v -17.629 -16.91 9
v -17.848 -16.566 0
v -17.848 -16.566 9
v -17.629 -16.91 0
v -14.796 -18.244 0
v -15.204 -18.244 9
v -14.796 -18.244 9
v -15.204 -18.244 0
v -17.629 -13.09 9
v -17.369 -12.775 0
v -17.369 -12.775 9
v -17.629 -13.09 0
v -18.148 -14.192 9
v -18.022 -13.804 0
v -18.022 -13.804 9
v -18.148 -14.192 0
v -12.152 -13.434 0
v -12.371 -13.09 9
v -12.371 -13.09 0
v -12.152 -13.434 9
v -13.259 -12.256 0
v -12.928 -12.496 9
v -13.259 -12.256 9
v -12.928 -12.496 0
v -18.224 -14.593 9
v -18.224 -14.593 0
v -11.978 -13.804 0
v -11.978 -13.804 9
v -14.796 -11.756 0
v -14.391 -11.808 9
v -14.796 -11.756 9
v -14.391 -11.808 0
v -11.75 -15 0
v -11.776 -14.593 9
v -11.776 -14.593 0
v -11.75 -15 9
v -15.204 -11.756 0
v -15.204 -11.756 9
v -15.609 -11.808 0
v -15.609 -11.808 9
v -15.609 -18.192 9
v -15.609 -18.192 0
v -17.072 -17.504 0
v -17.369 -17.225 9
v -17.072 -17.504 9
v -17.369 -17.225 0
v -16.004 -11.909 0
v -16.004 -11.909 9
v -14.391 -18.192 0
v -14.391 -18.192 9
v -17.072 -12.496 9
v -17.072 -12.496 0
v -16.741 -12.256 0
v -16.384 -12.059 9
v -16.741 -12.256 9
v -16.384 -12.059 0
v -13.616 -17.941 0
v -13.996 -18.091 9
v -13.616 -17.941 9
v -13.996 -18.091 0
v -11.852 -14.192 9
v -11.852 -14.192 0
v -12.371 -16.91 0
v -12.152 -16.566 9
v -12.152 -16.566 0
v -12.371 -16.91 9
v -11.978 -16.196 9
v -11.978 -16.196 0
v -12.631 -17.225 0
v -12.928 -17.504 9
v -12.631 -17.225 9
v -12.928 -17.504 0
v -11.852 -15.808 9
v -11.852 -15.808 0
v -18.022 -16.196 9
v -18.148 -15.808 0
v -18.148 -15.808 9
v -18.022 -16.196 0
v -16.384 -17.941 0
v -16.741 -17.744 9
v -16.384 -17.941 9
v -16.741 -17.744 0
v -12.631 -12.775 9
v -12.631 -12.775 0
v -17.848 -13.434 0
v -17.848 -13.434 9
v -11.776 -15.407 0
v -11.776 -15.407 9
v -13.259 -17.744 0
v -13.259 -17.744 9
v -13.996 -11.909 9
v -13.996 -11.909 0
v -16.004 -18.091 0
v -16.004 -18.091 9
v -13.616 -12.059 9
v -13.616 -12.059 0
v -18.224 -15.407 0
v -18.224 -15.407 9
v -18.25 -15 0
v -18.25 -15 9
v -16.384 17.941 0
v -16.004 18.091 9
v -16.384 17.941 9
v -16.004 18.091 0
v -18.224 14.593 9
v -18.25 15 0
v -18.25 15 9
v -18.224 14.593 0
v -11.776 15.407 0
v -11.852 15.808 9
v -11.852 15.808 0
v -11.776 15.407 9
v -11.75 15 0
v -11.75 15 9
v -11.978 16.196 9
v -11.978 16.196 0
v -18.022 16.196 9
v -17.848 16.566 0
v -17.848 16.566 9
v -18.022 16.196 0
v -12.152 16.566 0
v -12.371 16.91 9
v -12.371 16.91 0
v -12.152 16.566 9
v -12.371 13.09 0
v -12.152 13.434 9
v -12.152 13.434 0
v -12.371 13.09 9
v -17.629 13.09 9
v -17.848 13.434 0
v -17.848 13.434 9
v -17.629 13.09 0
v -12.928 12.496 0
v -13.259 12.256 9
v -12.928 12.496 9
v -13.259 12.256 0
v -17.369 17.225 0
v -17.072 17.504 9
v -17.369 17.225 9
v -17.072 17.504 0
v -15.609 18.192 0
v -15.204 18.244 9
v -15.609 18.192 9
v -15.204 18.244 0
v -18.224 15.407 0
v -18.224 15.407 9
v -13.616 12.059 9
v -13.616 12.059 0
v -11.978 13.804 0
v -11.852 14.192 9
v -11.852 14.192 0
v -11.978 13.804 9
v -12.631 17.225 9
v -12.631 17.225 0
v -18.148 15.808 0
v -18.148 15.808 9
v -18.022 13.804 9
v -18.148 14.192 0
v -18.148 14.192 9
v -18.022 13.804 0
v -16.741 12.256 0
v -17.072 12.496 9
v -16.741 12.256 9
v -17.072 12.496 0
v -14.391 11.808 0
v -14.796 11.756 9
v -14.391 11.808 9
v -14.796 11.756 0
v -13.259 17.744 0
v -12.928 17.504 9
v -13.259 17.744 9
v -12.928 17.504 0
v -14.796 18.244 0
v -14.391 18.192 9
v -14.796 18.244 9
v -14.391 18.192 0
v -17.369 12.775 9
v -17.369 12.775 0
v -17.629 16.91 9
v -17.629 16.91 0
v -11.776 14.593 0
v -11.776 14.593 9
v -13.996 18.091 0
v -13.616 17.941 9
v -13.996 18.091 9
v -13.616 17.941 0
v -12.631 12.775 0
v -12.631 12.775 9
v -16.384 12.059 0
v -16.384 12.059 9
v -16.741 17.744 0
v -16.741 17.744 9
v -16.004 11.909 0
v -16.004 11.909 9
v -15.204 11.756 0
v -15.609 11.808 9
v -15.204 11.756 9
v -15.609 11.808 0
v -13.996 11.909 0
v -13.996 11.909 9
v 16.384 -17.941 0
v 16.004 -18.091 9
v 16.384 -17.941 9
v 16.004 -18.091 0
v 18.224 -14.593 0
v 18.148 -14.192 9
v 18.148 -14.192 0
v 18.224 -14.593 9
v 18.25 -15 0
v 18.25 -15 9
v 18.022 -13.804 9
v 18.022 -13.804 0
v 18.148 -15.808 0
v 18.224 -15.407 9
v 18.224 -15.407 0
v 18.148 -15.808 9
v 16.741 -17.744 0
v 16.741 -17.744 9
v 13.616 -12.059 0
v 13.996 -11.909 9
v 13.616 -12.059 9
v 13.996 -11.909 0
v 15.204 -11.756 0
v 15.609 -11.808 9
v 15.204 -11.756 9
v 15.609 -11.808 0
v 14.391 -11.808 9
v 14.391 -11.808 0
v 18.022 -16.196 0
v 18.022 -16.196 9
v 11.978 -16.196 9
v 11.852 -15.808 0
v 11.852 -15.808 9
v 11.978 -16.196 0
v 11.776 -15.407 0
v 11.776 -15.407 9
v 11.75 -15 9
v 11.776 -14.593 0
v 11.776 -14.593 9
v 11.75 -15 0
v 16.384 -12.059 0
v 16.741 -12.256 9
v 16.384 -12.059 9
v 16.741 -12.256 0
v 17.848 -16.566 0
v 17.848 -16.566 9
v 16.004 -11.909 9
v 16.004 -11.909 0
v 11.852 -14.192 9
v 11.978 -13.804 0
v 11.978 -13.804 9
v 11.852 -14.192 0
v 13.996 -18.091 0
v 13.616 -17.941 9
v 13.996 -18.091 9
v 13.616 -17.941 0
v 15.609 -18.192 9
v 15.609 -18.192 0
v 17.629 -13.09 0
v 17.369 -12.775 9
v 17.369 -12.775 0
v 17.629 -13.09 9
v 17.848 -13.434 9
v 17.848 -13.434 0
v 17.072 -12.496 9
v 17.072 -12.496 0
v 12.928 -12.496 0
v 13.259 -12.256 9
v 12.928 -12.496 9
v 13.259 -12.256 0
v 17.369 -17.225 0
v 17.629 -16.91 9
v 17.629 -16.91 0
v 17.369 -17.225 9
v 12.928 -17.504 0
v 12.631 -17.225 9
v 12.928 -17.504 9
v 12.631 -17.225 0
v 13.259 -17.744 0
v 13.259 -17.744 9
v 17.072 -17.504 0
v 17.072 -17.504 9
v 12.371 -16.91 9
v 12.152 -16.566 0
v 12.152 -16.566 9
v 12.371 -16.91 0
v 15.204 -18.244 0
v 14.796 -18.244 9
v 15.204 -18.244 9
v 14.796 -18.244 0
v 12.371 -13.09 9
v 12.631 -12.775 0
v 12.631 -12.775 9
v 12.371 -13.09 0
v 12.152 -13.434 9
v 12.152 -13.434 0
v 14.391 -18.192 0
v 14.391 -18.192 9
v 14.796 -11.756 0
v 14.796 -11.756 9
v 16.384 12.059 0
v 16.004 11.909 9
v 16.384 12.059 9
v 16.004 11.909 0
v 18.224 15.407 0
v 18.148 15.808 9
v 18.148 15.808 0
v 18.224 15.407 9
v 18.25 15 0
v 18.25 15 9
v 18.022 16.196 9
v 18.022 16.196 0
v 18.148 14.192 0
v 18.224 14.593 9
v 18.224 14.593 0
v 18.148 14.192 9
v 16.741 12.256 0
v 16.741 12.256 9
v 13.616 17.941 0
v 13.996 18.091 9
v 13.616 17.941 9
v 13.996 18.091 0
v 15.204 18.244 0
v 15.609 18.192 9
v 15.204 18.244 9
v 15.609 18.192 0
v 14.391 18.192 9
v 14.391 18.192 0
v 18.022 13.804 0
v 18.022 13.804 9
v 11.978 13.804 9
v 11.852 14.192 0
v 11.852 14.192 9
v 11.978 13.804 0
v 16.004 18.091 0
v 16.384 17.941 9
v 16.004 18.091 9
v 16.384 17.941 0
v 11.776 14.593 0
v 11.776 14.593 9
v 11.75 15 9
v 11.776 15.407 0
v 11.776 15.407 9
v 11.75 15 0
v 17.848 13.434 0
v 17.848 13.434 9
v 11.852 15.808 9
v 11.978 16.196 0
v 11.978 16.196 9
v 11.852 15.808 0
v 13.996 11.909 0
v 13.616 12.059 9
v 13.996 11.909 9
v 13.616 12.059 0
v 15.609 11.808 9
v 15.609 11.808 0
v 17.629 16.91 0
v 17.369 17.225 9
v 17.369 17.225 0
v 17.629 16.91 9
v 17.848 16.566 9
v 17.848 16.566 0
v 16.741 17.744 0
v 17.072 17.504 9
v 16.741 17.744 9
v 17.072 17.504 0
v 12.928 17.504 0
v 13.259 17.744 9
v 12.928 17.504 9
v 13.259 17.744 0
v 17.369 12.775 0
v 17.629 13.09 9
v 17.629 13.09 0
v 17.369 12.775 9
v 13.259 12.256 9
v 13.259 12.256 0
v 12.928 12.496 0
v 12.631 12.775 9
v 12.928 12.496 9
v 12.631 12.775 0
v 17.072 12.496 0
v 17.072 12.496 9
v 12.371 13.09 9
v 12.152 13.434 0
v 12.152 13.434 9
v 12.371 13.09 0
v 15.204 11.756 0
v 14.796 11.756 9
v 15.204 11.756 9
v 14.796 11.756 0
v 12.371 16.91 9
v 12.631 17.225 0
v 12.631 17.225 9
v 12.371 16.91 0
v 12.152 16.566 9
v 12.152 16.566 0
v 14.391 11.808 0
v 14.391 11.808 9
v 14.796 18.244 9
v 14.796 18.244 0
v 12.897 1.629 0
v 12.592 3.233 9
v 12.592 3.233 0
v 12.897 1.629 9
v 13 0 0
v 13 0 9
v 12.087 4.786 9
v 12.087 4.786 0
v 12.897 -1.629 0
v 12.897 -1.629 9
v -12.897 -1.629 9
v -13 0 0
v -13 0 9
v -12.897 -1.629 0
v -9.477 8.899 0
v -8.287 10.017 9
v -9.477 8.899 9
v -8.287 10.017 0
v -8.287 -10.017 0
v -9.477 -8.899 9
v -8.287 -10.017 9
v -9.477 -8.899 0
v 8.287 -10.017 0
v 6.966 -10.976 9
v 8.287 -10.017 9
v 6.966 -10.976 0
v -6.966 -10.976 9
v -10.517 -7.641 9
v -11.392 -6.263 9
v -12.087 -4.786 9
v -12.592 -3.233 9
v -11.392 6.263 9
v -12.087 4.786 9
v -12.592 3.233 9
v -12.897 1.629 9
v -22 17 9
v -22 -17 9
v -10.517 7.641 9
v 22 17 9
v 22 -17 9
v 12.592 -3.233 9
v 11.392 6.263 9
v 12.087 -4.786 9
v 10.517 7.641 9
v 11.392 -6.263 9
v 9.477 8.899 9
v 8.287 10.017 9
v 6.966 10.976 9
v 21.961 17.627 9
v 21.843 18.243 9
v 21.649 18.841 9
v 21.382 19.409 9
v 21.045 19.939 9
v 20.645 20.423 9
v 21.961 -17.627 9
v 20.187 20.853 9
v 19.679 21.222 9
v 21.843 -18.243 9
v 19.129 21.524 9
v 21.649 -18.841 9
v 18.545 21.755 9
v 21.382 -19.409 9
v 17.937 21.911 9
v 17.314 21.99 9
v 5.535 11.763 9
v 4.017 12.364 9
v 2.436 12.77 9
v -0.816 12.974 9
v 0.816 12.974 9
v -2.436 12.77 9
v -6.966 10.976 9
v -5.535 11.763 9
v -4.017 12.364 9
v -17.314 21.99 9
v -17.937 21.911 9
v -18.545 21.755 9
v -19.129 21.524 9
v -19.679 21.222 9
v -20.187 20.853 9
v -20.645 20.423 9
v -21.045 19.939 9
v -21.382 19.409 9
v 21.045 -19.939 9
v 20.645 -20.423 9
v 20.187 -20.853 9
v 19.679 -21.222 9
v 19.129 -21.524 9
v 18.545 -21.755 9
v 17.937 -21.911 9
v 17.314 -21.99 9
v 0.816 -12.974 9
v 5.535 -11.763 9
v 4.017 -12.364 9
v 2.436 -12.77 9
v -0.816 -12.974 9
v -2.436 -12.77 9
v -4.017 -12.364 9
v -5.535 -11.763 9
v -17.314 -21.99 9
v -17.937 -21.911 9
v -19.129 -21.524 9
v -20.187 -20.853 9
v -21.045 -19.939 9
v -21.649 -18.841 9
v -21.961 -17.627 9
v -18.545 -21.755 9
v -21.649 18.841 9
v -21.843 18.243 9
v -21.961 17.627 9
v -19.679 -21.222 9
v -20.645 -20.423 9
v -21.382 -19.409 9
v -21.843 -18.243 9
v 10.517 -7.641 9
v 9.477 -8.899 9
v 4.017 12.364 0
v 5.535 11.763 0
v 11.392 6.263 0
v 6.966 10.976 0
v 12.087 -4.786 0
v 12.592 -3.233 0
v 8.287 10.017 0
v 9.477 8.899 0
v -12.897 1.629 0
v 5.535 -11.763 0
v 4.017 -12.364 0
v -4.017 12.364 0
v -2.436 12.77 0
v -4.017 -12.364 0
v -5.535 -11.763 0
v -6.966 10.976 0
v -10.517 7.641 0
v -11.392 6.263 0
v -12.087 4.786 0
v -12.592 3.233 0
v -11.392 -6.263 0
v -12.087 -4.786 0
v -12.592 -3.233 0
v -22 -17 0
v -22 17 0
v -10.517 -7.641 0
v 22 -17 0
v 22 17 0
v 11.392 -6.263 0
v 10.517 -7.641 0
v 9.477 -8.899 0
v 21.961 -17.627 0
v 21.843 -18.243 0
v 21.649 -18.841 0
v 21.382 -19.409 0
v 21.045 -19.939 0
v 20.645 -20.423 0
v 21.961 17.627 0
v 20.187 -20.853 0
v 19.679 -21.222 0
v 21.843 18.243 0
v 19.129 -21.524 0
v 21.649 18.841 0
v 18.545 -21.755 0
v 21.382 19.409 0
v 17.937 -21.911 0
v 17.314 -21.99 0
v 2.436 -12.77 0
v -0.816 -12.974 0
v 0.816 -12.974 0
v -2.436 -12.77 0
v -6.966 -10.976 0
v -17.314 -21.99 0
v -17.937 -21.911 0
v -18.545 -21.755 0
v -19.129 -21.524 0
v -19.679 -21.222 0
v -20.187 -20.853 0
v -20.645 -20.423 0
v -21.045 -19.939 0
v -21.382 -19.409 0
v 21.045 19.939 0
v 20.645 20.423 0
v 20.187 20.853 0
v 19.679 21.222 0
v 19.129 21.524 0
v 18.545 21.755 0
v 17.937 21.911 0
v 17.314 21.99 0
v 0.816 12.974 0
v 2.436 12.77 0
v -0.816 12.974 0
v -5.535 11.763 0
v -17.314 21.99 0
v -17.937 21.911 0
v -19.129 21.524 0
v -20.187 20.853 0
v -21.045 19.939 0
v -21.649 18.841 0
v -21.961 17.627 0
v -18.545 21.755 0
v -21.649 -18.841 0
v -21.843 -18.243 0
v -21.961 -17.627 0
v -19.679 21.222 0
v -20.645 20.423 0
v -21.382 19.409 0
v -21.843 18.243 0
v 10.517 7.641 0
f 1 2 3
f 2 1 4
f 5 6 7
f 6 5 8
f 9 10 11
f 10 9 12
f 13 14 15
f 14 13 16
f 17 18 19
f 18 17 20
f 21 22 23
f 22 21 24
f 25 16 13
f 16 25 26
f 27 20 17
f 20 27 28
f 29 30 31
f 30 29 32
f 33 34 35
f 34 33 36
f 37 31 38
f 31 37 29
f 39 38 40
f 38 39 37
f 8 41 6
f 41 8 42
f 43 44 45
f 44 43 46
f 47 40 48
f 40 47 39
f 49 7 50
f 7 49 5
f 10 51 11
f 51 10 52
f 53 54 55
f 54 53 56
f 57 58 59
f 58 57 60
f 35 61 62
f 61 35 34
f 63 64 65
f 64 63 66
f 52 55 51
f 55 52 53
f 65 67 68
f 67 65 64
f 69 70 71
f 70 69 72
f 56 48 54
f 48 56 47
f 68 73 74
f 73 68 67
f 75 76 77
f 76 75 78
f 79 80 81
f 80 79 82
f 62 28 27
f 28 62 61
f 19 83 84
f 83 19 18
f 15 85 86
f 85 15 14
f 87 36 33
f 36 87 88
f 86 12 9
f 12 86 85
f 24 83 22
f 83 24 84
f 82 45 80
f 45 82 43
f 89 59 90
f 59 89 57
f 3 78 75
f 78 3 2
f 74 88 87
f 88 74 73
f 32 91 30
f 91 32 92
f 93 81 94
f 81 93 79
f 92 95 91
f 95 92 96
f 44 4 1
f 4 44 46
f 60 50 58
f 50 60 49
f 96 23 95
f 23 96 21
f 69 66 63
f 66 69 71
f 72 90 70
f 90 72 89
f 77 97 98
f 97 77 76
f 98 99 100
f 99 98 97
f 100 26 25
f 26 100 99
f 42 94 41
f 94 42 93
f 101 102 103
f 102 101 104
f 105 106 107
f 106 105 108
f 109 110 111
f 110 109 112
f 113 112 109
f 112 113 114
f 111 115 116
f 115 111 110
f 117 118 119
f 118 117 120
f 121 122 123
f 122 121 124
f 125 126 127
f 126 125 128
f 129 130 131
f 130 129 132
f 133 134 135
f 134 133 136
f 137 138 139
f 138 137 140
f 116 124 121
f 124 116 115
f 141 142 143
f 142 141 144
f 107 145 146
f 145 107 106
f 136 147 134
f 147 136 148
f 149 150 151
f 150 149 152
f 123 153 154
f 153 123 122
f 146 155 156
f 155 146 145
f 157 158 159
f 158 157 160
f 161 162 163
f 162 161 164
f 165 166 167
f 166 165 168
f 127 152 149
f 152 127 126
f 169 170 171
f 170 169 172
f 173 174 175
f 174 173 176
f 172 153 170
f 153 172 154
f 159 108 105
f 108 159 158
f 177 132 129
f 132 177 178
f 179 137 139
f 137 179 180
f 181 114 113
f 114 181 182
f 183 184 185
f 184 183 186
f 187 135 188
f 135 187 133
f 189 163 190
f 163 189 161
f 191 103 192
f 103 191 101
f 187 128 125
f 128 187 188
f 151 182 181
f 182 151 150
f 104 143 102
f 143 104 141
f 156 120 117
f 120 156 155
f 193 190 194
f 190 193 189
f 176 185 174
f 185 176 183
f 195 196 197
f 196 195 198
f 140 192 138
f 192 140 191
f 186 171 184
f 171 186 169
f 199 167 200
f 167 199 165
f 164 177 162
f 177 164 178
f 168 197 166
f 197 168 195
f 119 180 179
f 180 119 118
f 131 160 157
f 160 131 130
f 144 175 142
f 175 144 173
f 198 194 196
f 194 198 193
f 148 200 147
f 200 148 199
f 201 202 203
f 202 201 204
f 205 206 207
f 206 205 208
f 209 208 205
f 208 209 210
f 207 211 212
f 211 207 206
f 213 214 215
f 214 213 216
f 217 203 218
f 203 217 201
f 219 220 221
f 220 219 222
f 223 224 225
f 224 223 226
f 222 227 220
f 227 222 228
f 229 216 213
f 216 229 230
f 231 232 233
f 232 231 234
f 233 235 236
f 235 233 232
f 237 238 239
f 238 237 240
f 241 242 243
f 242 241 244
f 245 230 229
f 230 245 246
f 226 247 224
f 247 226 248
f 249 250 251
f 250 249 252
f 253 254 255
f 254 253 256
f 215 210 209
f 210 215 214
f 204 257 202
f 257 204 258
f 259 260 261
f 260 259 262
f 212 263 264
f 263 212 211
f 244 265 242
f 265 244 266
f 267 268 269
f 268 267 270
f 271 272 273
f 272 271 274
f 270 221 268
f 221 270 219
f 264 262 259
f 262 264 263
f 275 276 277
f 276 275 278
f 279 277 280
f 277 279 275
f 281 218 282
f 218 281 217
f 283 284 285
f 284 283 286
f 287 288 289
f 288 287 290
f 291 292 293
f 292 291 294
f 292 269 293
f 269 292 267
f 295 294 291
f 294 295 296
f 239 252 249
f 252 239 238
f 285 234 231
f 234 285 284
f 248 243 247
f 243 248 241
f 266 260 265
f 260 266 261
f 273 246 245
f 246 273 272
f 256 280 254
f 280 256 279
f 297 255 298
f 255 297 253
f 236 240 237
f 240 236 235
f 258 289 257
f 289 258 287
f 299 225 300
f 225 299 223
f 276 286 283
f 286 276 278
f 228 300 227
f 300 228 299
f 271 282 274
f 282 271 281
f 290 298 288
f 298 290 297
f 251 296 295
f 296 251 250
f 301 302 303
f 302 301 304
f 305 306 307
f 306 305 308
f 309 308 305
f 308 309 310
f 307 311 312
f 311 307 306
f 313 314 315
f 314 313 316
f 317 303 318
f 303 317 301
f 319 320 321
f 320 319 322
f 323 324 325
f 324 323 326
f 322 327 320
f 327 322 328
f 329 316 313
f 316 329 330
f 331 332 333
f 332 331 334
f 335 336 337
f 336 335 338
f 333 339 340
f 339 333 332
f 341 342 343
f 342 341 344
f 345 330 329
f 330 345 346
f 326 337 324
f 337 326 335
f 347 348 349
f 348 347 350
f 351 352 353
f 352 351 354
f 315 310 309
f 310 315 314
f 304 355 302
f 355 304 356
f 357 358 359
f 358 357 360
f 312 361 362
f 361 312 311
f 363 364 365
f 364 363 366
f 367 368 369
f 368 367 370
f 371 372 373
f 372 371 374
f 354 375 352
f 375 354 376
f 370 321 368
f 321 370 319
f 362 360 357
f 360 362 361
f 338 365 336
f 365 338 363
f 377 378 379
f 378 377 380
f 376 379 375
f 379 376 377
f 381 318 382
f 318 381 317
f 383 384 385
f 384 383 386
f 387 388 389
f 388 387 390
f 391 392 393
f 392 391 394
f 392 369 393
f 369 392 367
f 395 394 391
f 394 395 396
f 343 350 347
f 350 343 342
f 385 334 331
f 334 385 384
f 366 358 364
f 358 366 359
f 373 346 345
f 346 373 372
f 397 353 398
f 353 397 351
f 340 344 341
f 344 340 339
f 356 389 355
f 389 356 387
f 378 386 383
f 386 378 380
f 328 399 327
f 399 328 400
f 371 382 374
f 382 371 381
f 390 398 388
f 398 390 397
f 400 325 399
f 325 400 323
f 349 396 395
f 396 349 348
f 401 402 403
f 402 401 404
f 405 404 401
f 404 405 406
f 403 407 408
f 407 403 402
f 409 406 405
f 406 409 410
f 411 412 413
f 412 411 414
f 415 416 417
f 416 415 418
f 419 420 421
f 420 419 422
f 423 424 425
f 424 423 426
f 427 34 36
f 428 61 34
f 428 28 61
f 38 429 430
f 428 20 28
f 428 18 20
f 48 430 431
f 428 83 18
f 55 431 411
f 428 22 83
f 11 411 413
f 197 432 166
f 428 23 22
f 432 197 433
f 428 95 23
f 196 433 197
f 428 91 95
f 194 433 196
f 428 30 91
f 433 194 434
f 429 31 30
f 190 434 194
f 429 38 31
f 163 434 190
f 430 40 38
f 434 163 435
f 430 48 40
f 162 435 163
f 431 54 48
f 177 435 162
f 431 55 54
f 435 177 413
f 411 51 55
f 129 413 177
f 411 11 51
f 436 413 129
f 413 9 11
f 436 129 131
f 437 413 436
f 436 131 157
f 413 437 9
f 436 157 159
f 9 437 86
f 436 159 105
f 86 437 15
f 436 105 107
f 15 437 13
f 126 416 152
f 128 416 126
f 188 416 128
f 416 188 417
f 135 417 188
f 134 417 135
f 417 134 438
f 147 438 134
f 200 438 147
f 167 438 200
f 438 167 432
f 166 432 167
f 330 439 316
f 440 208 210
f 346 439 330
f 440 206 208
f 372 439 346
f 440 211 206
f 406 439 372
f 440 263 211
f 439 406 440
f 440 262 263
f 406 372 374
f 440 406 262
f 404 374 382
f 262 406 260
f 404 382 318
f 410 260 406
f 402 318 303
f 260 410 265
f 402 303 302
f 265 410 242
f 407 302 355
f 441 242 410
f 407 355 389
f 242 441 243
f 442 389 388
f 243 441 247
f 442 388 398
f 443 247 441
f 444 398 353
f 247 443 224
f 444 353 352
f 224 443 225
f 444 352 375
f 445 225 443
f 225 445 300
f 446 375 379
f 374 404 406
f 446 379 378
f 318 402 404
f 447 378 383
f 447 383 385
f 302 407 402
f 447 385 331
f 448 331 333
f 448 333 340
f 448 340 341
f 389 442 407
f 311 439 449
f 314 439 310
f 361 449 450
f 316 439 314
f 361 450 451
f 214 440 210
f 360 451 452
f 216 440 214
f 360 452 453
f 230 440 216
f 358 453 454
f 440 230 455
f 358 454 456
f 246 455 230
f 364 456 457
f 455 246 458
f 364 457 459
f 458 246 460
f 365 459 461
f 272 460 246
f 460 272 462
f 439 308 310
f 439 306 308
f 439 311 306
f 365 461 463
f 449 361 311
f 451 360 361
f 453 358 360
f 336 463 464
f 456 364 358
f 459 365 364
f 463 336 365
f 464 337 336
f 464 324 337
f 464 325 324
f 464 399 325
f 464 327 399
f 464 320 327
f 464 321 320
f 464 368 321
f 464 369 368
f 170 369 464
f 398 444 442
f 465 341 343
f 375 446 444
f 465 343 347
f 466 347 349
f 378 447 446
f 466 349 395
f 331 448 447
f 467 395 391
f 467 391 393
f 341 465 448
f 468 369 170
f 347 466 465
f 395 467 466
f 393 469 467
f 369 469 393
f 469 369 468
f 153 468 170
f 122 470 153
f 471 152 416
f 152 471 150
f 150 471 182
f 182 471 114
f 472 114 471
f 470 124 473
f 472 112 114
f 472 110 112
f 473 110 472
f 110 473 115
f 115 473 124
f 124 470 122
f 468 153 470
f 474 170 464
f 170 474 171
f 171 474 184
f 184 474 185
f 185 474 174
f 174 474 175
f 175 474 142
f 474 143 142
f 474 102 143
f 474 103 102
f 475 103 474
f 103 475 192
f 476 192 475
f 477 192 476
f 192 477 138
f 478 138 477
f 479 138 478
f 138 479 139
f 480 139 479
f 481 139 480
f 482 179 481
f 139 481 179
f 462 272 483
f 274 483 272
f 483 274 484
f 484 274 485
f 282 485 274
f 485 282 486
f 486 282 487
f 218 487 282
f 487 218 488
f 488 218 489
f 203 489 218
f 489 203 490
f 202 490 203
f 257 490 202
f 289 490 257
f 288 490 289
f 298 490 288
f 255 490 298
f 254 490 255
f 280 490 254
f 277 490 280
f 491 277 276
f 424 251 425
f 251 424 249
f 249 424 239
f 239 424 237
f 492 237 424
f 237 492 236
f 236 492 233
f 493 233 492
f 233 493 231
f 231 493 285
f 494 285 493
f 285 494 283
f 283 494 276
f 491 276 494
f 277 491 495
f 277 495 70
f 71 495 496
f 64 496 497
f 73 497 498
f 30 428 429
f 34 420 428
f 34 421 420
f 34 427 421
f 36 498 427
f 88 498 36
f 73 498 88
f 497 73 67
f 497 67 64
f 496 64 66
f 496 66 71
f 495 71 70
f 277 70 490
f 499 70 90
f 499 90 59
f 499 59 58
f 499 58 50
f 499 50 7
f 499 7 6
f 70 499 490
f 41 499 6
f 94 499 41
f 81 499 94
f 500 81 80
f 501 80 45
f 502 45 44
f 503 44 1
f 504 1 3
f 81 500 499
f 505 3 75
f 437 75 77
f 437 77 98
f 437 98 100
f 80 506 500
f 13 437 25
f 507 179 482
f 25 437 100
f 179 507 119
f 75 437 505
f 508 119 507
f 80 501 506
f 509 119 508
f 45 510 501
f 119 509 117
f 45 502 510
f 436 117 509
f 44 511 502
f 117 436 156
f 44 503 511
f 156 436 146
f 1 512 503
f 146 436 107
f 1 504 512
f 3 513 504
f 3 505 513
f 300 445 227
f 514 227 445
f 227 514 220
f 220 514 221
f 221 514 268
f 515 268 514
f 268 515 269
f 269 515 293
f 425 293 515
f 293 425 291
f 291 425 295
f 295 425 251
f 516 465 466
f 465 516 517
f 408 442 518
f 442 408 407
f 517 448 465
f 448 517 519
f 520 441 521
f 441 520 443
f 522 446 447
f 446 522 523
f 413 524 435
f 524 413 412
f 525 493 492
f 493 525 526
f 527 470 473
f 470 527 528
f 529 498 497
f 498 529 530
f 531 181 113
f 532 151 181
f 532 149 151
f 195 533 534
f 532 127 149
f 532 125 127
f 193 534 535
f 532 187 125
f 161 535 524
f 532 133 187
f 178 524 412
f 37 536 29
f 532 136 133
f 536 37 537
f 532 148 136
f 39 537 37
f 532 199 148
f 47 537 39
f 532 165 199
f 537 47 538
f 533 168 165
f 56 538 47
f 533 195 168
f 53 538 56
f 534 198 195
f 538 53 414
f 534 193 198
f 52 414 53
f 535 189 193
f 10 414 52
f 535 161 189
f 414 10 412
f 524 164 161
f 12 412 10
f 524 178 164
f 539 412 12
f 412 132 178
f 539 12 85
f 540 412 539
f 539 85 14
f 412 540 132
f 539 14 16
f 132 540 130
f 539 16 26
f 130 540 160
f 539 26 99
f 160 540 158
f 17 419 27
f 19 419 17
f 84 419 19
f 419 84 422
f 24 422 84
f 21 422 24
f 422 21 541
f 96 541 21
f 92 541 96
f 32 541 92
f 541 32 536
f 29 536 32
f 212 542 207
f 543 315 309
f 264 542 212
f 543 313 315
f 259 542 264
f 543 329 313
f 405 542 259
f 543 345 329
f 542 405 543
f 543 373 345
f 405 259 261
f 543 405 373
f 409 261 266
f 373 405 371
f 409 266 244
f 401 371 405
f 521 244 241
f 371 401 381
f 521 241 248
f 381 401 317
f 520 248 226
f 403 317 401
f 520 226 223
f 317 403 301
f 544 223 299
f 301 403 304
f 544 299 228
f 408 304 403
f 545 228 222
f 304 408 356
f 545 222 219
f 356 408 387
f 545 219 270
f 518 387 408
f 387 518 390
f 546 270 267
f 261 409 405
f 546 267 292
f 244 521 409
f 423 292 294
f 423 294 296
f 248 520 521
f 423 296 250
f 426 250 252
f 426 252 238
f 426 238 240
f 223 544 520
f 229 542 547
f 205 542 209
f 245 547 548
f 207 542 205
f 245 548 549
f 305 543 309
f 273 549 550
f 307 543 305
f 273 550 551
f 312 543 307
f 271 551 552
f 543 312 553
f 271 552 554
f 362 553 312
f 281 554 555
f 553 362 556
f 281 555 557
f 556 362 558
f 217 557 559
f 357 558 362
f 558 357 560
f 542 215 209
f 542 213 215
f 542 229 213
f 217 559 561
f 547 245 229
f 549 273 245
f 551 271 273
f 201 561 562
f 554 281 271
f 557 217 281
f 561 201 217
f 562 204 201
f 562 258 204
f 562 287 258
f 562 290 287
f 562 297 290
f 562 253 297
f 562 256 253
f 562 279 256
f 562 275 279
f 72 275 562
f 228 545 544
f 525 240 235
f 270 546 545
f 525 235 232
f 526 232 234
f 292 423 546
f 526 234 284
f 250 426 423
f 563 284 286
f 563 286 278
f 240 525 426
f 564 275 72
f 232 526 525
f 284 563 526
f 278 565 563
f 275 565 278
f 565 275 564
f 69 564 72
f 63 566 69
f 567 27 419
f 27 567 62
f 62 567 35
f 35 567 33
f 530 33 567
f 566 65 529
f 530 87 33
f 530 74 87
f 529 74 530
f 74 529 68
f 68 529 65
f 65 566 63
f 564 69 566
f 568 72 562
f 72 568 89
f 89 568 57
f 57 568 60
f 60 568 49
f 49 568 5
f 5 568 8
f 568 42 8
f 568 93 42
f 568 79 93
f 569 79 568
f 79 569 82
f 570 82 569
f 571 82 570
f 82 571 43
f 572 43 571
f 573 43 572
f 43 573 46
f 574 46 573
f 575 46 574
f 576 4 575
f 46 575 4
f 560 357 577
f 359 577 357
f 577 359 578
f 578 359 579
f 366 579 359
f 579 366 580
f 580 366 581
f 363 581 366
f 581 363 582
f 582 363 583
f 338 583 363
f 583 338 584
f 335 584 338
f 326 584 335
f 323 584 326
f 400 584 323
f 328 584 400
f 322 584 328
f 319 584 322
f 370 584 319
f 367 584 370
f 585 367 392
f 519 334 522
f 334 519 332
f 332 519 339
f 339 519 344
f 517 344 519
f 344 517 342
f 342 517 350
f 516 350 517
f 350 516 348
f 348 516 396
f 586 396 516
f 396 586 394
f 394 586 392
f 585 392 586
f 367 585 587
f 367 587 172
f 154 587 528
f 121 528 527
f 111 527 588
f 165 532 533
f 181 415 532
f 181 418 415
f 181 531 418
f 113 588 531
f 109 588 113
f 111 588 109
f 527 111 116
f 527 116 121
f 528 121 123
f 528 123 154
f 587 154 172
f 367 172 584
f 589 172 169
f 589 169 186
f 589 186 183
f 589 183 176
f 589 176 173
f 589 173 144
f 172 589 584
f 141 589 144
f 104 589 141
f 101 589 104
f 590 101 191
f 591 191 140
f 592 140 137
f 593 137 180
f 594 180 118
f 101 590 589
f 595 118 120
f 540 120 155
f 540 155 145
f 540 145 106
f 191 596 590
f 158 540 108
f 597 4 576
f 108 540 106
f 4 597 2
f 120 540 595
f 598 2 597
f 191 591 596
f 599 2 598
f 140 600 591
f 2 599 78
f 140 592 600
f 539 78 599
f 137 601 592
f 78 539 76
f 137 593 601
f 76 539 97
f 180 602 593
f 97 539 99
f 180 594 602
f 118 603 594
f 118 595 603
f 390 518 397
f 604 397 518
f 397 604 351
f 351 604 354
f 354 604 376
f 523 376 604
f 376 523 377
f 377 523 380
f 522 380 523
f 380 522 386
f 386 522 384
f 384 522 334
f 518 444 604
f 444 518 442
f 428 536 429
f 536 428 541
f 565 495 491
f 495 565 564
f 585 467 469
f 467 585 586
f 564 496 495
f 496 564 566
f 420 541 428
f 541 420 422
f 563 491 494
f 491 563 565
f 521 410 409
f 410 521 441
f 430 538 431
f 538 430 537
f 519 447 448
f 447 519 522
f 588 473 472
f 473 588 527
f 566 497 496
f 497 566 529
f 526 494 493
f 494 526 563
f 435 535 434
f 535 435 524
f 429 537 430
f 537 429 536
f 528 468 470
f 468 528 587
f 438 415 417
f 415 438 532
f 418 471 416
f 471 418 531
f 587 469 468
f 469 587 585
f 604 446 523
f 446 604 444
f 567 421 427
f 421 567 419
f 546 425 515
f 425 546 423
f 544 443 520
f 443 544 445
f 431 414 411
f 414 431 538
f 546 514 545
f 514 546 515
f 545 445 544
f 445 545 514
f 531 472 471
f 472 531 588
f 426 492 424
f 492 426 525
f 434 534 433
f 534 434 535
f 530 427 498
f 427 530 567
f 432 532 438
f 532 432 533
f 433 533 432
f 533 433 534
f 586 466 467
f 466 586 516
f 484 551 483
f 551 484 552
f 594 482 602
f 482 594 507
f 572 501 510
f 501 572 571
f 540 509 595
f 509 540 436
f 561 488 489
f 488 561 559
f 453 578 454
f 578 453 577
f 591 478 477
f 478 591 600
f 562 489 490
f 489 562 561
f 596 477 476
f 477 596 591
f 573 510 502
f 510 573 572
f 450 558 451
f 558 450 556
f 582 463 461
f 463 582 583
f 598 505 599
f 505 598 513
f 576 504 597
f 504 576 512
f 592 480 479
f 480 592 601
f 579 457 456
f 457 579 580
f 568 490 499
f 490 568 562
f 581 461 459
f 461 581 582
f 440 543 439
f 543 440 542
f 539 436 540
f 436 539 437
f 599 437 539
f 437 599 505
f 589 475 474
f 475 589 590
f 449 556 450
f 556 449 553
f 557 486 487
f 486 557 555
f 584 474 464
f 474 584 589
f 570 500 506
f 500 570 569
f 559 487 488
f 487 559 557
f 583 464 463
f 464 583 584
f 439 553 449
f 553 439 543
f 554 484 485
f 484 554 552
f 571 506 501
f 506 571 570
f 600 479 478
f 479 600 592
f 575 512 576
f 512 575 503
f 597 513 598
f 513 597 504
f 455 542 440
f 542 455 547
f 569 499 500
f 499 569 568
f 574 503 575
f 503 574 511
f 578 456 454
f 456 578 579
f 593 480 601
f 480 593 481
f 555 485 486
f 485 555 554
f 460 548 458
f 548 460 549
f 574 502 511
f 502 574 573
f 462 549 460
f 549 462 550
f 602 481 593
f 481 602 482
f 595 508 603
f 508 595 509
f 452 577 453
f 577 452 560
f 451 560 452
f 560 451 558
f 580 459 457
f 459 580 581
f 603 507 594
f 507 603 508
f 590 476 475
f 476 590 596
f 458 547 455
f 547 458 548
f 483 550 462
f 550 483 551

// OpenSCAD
$fn = 50;


difference() {
	union() {
		hull() {
			translate(v = [-17.0000000000, 17.0000000000, 0]) {
				cylinder(h = 9, r = 5);
			}
			translate(v = [17.0000000000, 17.0000000000, 0]) {
				cylinder(h = 9, r = 5);
			}
			translate(v = [-17.0000000000, -17.0000000000, 0]) {
				cylinder(h = 9, r = 5);
			}
			translate(v = [17.0000000000, -17.0000000000, 0]) {
				cylinder(h = 9, r = 5);
			}
		}
	}
	union() {
		#translate(v = [-15.0000000000, -15.0000000000, -100.0000000000]) {
			cylinder(h = 200, r = 3.2500000000);
		}
		#translate(v = [-15.0000000000, 15.0000000000, -100.0000000000]) {
			cylinder(h = 200, r = 3.2500000000);
		}
		#translate(v = [15.0000000000, -15.0000000000, -100.0000000000]) {
			cylinder(h = 200, r = 3.2500000000);
		}
		#translate(v = [15.0000000000, 15.0000000000, -100.0000000000]) {
			cylinder(h = 200, r = 3.2500000000);
		}
		#cylinder(h = 9, r = 13.0000000000);
	}
}
